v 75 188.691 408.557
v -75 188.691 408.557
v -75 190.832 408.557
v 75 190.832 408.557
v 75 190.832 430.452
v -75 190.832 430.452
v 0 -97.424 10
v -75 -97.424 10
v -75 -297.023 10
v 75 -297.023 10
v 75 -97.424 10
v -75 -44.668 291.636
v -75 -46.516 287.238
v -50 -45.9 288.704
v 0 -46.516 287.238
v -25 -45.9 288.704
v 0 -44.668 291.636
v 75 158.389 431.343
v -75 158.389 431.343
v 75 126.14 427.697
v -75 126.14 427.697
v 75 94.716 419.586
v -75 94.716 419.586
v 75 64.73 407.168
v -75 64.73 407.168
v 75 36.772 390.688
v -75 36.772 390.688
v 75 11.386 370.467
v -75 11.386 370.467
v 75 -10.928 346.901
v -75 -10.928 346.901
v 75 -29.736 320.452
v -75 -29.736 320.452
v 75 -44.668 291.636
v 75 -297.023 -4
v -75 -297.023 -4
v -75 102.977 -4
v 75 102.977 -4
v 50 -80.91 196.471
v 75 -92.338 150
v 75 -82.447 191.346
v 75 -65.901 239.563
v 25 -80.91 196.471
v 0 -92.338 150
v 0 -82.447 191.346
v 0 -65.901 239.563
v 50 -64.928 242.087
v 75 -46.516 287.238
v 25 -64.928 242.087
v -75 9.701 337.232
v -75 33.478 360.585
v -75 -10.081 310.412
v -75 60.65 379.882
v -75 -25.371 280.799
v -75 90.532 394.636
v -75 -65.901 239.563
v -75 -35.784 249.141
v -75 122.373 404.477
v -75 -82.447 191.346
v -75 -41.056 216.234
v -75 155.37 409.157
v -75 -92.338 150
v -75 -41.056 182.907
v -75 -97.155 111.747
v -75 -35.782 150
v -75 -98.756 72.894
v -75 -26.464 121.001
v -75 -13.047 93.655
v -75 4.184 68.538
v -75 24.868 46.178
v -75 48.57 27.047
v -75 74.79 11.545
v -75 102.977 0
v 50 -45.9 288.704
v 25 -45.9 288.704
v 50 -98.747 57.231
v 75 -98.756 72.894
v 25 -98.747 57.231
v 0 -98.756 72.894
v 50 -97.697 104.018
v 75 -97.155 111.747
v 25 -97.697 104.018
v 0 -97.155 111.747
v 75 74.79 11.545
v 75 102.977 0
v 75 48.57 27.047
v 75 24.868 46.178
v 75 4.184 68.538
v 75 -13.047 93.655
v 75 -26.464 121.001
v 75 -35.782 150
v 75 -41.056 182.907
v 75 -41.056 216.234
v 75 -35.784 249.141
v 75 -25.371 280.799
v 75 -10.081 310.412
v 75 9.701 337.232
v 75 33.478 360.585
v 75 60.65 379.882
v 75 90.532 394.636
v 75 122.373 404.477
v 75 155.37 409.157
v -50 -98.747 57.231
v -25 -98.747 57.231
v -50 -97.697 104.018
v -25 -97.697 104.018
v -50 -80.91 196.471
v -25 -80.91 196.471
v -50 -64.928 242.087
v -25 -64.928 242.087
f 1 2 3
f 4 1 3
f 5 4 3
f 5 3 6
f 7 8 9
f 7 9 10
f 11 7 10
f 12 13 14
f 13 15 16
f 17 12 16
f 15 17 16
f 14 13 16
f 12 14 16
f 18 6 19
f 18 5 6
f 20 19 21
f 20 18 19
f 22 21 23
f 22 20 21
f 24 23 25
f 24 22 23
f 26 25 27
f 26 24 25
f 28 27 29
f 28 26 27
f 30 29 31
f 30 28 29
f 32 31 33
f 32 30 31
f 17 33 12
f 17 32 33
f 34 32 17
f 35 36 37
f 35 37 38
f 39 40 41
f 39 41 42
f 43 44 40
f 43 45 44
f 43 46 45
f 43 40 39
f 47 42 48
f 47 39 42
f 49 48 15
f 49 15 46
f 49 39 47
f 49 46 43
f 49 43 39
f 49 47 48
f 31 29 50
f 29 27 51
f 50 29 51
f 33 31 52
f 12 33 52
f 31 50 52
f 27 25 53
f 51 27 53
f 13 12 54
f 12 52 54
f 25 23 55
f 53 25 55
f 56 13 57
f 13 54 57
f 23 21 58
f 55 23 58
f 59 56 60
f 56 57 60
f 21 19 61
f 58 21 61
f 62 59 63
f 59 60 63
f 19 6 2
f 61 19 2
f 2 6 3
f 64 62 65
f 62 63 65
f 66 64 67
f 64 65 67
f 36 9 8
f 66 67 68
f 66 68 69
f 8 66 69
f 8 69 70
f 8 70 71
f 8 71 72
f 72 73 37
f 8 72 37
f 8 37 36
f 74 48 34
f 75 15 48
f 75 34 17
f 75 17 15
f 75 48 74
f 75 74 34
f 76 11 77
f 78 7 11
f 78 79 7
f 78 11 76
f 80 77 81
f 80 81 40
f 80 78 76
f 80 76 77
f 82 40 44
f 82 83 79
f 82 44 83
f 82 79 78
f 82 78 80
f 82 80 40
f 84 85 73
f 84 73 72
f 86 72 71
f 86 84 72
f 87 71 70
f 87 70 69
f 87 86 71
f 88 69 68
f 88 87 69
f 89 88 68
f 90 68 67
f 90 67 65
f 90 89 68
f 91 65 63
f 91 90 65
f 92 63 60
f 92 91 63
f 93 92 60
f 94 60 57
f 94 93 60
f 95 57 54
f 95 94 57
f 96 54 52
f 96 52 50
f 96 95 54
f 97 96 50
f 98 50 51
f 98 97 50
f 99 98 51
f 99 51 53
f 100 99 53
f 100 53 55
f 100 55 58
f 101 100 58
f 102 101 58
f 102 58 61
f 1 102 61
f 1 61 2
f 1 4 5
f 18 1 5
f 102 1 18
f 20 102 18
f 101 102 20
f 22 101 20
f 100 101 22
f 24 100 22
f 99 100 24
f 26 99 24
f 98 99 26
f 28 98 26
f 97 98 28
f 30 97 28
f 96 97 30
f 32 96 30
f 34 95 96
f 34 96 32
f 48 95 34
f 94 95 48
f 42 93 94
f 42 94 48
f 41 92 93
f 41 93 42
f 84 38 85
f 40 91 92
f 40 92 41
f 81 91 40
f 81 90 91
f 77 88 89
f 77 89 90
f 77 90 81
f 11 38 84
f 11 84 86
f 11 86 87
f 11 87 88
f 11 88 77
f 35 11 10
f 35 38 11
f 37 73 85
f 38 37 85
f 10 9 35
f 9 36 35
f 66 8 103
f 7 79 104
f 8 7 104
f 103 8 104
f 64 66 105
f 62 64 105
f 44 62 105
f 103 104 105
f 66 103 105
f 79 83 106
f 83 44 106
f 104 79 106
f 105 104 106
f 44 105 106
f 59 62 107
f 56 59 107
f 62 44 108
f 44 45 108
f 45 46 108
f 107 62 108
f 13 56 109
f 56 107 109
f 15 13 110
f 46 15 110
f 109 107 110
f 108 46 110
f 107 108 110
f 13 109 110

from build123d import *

# Parameters (mm, degrees)
F1_DEPTH = 75
F2_DEPTH = 4
F3_DEPTH = 200
F4_DEPTH = 10


with BuildPart() as f1:
    # F0 (on Right) → F1 (new body, symmetric)
    with BuildSketch(Plane.YZ):
        with BuildLine():
            Line((-92.3375381151, 150), (-58.3594357527, 150))
            ThreePointArc((-58.3594357527, 150), (-62.8590677445, 219.5182916975), (-46.5160623858, 287.2379029225))
            add(Edge.make_bspline(
                [(-92.3375381151, 150), (-83.8972050592, 197.0286155209), (-65.4330781641, 242.1901230497), (-46.5160623858, 287.2379029225)],
                knots=[0.5005259003, 0.5005259003, 0.5005259003, 0.5005259003, 0.9842554423, 0.9842554423, 0.9842554423, 0.9842554423], degree=3))
        make_face()
        with BuildLine():
            Line((-97.0230517394, 0), (50.0025975795, 0))
            ThreePointArc((50.0025975795, 0), (-19.782437401, 63.7274456487), (-58.3594357527, 150))
            Line((-58.3594357527, 150), (-92.3375381151, 150))
            add(Edge.make_bspline(
                [(-97.0230517394, 0), (-99.0723612734, 50.6778343669), (-101.0709416697, 101.3384276147), (-92.3375381151, 150)],
                knots=[0, 0, 0, 0, 0.5005259003, 0.5005259003, 0.5005259003, 0.5005259003], degree=3))
        make_face()
        with BuildLine():
            Line((-58.3594357527, 150), (-35.7824824753, 150))
            ThreePointArc((-35.7824824753, 150), (9.701095737, 337.2321487603), (188.6912309552, 408.5565128374))
            Line((188.6912309552, 408.5565128374), (190.8316842979, 408.5565128374))
            Line((190.8316842979, 408.5565128374), (190.8316842979, 430.4521389342))
            ThreePointArc((190.8316842979, 430.4521389342), (50.4625001931, 399.417827924), (-44.6678048686, 291.636283284))
            add(Edge.make_bspline(
                [(-46.5160623858, 287.2379029225), (-45.9003463268, 288.7041300386), (-45.284150482, 290.1702366729), (-44.6678048686, 291.636283284)],
                knots=[0.9842554423, 0.9842554423, 0.9842554423, 0.9842554423, 1, 1, 1, 1], degree=3))
            ThreePointArc((-46.5160623858, 287.2379029225), (-62.8590677445, 219.5182916975), (-58.3594357527, 150))
        make_face()
        with BuildLine():
            Line((50.0025975795, 0), (102.9769482606, 0))
            ThreePointArc((102.9769482606, 0), (14.1204583697, 56.9827590308), (-35.7824824753, 150))
            Line((-35.7824824753, 150), (-58.3594357527, 150))
            ThreePointArc((-58.3594357527, 150), (-19.782437401, 63.7274456487), (50.0025975795, 0))
        make_face()
    extrude(amount=F1_DEPTH, both=True)

    # F2 (add): a face of the model
    f2_faces = [f1.faces().sort_by_distance(p)[0] for p in [
        (0, 2.9769482606, 0),
    ]]
    extrude(f2_faces, amount=F2_DEPTH)

    # F3 (add): a face of the model
    f3_faces = [f1.faces().sort_by_distance(p)[0] for p in [
        (0, -97.0230517394, -2),
    ]]
    extrude(f3_faces, amount=F3_DEPTH)

    # F4 (add): a face of the model
    f4_faces = [f1.faces().sort_by_distance(p)[0] for p in [
        (0, -197.0230517394, 0),
    ]]
    extrude(f4_faces, amount=F4_DEPTH)


solid = f1.part
